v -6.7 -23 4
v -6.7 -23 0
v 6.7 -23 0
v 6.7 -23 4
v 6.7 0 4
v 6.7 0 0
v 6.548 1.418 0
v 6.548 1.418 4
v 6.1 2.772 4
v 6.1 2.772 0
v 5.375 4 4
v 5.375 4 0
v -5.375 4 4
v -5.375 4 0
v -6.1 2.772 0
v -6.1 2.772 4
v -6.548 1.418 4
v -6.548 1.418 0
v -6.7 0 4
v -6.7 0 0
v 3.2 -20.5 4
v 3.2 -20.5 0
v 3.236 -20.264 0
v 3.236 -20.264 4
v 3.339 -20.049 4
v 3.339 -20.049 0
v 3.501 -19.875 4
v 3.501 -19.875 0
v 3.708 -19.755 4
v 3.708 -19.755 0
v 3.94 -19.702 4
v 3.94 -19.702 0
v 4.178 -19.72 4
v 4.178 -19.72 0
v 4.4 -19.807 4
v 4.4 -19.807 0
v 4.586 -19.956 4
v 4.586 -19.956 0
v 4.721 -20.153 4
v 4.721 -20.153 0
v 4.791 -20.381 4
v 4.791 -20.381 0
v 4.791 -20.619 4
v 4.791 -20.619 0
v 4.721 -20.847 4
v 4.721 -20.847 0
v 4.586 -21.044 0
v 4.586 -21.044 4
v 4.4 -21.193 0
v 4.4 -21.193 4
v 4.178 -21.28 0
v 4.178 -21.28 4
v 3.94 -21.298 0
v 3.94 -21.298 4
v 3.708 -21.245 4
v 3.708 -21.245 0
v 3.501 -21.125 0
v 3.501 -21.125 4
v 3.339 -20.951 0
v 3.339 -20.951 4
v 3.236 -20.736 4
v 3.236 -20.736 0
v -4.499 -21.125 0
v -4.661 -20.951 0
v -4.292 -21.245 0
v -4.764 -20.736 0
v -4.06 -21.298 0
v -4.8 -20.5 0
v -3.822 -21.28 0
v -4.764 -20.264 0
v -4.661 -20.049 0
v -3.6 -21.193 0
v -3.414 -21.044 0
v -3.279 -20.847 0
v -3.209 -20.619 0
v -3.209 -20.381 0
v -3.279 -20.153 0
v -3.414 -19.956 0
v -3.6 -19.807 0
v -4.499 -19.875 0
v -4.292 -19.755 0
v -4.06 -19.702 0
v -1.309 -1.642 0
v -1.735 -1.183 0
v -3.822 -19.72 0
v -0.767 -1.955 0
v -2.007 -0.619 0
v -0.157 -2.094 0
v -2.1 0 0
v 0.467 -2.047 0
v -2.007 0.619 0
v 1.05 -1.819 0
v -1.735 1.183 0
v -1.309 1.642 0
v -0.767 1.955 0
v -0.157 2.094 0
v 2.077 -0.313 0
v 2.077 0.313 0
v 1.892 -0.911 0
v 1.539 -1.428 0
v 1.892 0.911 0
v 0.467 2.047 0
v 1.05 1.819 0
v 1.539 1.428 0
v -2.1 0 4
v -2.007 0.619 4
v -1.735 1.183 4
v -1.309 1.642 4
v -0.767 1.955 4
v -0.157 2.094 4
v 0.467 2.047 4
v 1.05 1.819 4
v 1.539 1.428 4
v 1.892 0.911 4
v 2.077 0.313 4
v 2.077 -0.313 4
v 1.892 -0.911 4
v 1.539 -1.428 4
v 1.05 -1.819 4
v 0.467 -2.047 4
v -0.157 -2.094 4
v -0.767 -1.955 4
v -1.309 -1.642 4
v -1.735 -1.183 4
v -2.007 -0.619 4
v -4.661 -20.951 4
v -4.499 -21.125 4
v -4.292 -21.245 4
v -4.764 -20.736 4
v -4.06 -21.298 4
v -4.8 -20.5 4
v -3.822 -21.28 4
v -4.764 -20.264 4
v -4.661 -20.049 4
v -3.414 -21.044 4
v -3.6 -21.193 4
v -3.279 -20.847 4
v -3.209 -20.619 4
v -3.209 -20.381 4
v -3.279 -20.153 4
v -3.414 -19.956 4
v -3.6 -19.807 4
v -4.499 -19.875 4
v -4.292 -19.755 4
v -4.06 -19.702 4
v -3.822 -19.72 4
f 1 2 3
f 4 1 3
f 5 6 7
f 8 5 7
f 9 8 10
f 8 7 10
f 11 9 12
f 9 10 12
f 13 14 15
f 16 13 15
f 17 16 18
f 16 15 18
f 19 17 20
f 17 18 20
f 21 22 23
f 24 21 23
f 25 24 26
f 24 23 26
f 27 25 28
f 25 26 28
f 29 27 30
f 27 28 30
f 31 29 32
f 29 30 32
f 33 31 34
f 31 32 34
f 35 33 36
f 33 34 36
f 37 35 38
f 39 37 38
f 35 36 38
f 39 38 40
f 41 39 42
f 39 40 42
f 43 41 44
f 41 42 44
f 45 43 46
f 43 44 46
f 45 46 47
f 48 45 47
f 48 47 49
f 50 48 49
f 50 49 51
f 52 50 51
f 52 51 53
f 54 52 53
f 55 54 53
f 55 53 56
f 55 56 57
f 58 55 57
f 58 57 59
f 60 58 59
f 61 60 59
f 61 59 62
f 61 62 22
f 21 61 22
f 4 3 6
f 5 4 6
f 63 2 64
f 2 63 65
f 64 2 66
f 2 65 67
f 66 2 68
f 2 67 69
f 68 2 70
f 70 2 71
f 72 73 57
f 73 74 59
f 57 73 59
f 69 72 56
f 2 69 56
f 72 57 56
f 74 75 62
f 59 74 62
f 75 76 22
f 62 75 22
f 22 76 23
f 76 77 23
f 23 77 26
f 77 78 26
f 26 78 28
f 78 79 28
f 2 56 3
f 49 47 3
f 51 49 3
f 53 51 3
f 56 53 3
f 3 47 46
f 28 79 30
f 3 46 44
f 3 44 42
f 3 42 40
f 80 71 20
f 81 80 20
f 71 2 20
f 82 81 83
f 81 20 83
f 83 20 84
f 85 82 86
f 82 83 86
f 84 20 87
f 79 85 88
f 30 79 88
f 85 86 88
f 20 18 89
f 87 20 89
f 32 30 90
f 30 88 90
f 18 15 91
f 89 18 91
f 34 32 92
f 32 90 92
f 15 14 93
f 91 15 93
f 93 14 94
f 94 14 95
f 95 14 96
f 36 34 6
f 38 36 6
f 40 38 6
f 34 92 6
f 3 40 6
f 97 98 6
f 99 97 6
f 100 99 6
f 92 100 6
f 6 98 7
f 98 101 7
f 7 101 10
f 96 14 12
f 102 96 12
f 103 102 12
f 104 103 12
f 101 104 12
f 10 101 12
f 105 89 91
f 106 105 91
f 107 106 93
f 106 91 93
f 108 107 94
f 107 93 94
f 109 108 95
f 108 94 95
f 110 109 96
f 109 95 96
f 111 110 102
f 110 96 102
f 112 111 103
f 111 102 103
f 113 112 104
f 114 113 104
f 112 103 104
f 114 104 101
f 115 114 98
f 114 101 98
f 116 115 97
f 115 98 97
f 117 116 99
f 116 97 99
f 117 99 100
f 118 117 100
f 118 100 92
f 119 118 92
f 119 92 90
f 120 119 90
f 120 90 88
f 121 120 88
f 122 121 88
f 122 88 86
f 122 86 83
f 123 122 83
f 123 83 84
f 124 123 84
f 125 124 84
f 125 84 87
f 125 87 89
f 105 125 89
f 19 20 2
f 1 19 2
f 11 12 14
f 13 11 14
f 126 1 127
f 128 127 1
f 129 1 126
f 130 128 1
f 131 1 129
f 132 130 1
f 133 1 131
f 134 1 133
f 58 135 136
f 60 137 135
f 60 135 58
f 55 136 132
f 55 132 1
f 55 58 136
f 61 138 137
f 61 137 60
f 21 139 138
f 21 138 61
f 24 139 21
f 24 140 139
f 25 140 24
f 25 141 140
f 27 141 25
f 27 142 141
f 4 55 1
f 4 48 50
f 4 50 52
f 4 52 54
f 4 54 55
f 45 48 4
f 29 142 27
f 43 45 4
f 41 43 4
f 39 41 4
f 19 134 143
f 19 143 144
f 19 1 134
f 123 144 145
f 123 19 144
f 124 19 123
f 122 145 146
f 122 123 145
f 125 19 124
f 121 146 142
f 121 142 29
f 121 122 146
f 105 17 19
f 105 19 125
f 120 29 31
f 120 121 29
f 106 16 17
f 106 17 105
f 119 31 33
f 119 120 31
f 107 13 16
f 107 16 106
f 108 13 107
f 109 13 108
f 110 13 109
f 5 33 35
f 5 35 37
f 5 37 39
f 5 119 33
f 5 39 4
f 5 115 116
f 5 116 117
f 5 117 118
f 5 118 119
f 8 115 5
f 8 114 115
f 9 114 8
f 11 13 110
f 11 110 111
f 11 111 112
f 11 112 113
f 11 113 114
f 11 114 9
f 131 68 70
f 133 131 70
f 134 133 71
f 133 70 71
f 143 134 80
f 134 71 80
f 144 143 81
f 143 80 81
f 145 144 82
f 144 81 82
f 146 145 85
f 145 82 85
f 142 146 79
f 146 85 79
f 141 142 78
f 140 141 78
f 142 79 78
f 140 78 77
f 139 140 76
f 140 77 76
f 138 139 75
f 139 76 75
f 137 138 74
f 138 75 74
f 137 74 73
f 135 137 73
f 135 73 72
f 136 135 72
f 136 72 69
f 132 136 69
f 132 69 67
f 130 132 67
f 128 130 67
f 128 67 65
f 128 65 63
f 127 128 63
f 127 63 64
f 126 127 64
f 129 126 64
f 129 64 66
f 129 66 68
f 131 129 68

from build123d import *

# Parameters (mm, degrees)
RESSALTO_EXTRUS_O1_DEPTH                = 4
FURO_ROSCADO_DE_M2X0_41_D               = 1.6
FURO_ROSCADO_PARA_CONDU_TE_DE_M4X0_71_D = 4.2


with BuildPart() as part:
    # Esboço1 → Ressalto-extrusão1 (new body)
    with BuildSketch(Plane.XY):
        with BuildLine():
            Line((-6.7, 0), (-6.7, -23))
            Line((-6.7, -23), (6.7, -23))
            Line((6.7, -23), (6.7, 0))
            ThreePointArc((6.7, 0), (6.360114404, 2.10688034), (5.37494186, 4))
            Line((5.37494186, 4), (-5.37494186, 4))
            ThreePointArc((-5.37494186, 4), (-6.360114404, 2.10688034), (-6.7, 0))
        make_face()
    extrude(amount=RESSALTO_EXTRUS_O1_DEPTH)

    # Furo roscado de M2x0.41 (through all)
    with Locations(Plane(origin=(-4, -20.5, 4), x_dir=(1, 0, 0), z_dir=(0, 0, 1))):
        with Locations((0, 0), (8, 0)):
            Hole(FURO_ROSCADO_DE_M2X0_41_D / 2)

    # Furo roscado para conduíte de M4x0.71 (through all)
    with Locations(Plane.XY.offset(4)):
        with Locations((0, 0)):
            Hole(FURO_ROSCADO_PARA_CONDU_TE_DE_M4X0_71_D / 2)


solid = part.part
